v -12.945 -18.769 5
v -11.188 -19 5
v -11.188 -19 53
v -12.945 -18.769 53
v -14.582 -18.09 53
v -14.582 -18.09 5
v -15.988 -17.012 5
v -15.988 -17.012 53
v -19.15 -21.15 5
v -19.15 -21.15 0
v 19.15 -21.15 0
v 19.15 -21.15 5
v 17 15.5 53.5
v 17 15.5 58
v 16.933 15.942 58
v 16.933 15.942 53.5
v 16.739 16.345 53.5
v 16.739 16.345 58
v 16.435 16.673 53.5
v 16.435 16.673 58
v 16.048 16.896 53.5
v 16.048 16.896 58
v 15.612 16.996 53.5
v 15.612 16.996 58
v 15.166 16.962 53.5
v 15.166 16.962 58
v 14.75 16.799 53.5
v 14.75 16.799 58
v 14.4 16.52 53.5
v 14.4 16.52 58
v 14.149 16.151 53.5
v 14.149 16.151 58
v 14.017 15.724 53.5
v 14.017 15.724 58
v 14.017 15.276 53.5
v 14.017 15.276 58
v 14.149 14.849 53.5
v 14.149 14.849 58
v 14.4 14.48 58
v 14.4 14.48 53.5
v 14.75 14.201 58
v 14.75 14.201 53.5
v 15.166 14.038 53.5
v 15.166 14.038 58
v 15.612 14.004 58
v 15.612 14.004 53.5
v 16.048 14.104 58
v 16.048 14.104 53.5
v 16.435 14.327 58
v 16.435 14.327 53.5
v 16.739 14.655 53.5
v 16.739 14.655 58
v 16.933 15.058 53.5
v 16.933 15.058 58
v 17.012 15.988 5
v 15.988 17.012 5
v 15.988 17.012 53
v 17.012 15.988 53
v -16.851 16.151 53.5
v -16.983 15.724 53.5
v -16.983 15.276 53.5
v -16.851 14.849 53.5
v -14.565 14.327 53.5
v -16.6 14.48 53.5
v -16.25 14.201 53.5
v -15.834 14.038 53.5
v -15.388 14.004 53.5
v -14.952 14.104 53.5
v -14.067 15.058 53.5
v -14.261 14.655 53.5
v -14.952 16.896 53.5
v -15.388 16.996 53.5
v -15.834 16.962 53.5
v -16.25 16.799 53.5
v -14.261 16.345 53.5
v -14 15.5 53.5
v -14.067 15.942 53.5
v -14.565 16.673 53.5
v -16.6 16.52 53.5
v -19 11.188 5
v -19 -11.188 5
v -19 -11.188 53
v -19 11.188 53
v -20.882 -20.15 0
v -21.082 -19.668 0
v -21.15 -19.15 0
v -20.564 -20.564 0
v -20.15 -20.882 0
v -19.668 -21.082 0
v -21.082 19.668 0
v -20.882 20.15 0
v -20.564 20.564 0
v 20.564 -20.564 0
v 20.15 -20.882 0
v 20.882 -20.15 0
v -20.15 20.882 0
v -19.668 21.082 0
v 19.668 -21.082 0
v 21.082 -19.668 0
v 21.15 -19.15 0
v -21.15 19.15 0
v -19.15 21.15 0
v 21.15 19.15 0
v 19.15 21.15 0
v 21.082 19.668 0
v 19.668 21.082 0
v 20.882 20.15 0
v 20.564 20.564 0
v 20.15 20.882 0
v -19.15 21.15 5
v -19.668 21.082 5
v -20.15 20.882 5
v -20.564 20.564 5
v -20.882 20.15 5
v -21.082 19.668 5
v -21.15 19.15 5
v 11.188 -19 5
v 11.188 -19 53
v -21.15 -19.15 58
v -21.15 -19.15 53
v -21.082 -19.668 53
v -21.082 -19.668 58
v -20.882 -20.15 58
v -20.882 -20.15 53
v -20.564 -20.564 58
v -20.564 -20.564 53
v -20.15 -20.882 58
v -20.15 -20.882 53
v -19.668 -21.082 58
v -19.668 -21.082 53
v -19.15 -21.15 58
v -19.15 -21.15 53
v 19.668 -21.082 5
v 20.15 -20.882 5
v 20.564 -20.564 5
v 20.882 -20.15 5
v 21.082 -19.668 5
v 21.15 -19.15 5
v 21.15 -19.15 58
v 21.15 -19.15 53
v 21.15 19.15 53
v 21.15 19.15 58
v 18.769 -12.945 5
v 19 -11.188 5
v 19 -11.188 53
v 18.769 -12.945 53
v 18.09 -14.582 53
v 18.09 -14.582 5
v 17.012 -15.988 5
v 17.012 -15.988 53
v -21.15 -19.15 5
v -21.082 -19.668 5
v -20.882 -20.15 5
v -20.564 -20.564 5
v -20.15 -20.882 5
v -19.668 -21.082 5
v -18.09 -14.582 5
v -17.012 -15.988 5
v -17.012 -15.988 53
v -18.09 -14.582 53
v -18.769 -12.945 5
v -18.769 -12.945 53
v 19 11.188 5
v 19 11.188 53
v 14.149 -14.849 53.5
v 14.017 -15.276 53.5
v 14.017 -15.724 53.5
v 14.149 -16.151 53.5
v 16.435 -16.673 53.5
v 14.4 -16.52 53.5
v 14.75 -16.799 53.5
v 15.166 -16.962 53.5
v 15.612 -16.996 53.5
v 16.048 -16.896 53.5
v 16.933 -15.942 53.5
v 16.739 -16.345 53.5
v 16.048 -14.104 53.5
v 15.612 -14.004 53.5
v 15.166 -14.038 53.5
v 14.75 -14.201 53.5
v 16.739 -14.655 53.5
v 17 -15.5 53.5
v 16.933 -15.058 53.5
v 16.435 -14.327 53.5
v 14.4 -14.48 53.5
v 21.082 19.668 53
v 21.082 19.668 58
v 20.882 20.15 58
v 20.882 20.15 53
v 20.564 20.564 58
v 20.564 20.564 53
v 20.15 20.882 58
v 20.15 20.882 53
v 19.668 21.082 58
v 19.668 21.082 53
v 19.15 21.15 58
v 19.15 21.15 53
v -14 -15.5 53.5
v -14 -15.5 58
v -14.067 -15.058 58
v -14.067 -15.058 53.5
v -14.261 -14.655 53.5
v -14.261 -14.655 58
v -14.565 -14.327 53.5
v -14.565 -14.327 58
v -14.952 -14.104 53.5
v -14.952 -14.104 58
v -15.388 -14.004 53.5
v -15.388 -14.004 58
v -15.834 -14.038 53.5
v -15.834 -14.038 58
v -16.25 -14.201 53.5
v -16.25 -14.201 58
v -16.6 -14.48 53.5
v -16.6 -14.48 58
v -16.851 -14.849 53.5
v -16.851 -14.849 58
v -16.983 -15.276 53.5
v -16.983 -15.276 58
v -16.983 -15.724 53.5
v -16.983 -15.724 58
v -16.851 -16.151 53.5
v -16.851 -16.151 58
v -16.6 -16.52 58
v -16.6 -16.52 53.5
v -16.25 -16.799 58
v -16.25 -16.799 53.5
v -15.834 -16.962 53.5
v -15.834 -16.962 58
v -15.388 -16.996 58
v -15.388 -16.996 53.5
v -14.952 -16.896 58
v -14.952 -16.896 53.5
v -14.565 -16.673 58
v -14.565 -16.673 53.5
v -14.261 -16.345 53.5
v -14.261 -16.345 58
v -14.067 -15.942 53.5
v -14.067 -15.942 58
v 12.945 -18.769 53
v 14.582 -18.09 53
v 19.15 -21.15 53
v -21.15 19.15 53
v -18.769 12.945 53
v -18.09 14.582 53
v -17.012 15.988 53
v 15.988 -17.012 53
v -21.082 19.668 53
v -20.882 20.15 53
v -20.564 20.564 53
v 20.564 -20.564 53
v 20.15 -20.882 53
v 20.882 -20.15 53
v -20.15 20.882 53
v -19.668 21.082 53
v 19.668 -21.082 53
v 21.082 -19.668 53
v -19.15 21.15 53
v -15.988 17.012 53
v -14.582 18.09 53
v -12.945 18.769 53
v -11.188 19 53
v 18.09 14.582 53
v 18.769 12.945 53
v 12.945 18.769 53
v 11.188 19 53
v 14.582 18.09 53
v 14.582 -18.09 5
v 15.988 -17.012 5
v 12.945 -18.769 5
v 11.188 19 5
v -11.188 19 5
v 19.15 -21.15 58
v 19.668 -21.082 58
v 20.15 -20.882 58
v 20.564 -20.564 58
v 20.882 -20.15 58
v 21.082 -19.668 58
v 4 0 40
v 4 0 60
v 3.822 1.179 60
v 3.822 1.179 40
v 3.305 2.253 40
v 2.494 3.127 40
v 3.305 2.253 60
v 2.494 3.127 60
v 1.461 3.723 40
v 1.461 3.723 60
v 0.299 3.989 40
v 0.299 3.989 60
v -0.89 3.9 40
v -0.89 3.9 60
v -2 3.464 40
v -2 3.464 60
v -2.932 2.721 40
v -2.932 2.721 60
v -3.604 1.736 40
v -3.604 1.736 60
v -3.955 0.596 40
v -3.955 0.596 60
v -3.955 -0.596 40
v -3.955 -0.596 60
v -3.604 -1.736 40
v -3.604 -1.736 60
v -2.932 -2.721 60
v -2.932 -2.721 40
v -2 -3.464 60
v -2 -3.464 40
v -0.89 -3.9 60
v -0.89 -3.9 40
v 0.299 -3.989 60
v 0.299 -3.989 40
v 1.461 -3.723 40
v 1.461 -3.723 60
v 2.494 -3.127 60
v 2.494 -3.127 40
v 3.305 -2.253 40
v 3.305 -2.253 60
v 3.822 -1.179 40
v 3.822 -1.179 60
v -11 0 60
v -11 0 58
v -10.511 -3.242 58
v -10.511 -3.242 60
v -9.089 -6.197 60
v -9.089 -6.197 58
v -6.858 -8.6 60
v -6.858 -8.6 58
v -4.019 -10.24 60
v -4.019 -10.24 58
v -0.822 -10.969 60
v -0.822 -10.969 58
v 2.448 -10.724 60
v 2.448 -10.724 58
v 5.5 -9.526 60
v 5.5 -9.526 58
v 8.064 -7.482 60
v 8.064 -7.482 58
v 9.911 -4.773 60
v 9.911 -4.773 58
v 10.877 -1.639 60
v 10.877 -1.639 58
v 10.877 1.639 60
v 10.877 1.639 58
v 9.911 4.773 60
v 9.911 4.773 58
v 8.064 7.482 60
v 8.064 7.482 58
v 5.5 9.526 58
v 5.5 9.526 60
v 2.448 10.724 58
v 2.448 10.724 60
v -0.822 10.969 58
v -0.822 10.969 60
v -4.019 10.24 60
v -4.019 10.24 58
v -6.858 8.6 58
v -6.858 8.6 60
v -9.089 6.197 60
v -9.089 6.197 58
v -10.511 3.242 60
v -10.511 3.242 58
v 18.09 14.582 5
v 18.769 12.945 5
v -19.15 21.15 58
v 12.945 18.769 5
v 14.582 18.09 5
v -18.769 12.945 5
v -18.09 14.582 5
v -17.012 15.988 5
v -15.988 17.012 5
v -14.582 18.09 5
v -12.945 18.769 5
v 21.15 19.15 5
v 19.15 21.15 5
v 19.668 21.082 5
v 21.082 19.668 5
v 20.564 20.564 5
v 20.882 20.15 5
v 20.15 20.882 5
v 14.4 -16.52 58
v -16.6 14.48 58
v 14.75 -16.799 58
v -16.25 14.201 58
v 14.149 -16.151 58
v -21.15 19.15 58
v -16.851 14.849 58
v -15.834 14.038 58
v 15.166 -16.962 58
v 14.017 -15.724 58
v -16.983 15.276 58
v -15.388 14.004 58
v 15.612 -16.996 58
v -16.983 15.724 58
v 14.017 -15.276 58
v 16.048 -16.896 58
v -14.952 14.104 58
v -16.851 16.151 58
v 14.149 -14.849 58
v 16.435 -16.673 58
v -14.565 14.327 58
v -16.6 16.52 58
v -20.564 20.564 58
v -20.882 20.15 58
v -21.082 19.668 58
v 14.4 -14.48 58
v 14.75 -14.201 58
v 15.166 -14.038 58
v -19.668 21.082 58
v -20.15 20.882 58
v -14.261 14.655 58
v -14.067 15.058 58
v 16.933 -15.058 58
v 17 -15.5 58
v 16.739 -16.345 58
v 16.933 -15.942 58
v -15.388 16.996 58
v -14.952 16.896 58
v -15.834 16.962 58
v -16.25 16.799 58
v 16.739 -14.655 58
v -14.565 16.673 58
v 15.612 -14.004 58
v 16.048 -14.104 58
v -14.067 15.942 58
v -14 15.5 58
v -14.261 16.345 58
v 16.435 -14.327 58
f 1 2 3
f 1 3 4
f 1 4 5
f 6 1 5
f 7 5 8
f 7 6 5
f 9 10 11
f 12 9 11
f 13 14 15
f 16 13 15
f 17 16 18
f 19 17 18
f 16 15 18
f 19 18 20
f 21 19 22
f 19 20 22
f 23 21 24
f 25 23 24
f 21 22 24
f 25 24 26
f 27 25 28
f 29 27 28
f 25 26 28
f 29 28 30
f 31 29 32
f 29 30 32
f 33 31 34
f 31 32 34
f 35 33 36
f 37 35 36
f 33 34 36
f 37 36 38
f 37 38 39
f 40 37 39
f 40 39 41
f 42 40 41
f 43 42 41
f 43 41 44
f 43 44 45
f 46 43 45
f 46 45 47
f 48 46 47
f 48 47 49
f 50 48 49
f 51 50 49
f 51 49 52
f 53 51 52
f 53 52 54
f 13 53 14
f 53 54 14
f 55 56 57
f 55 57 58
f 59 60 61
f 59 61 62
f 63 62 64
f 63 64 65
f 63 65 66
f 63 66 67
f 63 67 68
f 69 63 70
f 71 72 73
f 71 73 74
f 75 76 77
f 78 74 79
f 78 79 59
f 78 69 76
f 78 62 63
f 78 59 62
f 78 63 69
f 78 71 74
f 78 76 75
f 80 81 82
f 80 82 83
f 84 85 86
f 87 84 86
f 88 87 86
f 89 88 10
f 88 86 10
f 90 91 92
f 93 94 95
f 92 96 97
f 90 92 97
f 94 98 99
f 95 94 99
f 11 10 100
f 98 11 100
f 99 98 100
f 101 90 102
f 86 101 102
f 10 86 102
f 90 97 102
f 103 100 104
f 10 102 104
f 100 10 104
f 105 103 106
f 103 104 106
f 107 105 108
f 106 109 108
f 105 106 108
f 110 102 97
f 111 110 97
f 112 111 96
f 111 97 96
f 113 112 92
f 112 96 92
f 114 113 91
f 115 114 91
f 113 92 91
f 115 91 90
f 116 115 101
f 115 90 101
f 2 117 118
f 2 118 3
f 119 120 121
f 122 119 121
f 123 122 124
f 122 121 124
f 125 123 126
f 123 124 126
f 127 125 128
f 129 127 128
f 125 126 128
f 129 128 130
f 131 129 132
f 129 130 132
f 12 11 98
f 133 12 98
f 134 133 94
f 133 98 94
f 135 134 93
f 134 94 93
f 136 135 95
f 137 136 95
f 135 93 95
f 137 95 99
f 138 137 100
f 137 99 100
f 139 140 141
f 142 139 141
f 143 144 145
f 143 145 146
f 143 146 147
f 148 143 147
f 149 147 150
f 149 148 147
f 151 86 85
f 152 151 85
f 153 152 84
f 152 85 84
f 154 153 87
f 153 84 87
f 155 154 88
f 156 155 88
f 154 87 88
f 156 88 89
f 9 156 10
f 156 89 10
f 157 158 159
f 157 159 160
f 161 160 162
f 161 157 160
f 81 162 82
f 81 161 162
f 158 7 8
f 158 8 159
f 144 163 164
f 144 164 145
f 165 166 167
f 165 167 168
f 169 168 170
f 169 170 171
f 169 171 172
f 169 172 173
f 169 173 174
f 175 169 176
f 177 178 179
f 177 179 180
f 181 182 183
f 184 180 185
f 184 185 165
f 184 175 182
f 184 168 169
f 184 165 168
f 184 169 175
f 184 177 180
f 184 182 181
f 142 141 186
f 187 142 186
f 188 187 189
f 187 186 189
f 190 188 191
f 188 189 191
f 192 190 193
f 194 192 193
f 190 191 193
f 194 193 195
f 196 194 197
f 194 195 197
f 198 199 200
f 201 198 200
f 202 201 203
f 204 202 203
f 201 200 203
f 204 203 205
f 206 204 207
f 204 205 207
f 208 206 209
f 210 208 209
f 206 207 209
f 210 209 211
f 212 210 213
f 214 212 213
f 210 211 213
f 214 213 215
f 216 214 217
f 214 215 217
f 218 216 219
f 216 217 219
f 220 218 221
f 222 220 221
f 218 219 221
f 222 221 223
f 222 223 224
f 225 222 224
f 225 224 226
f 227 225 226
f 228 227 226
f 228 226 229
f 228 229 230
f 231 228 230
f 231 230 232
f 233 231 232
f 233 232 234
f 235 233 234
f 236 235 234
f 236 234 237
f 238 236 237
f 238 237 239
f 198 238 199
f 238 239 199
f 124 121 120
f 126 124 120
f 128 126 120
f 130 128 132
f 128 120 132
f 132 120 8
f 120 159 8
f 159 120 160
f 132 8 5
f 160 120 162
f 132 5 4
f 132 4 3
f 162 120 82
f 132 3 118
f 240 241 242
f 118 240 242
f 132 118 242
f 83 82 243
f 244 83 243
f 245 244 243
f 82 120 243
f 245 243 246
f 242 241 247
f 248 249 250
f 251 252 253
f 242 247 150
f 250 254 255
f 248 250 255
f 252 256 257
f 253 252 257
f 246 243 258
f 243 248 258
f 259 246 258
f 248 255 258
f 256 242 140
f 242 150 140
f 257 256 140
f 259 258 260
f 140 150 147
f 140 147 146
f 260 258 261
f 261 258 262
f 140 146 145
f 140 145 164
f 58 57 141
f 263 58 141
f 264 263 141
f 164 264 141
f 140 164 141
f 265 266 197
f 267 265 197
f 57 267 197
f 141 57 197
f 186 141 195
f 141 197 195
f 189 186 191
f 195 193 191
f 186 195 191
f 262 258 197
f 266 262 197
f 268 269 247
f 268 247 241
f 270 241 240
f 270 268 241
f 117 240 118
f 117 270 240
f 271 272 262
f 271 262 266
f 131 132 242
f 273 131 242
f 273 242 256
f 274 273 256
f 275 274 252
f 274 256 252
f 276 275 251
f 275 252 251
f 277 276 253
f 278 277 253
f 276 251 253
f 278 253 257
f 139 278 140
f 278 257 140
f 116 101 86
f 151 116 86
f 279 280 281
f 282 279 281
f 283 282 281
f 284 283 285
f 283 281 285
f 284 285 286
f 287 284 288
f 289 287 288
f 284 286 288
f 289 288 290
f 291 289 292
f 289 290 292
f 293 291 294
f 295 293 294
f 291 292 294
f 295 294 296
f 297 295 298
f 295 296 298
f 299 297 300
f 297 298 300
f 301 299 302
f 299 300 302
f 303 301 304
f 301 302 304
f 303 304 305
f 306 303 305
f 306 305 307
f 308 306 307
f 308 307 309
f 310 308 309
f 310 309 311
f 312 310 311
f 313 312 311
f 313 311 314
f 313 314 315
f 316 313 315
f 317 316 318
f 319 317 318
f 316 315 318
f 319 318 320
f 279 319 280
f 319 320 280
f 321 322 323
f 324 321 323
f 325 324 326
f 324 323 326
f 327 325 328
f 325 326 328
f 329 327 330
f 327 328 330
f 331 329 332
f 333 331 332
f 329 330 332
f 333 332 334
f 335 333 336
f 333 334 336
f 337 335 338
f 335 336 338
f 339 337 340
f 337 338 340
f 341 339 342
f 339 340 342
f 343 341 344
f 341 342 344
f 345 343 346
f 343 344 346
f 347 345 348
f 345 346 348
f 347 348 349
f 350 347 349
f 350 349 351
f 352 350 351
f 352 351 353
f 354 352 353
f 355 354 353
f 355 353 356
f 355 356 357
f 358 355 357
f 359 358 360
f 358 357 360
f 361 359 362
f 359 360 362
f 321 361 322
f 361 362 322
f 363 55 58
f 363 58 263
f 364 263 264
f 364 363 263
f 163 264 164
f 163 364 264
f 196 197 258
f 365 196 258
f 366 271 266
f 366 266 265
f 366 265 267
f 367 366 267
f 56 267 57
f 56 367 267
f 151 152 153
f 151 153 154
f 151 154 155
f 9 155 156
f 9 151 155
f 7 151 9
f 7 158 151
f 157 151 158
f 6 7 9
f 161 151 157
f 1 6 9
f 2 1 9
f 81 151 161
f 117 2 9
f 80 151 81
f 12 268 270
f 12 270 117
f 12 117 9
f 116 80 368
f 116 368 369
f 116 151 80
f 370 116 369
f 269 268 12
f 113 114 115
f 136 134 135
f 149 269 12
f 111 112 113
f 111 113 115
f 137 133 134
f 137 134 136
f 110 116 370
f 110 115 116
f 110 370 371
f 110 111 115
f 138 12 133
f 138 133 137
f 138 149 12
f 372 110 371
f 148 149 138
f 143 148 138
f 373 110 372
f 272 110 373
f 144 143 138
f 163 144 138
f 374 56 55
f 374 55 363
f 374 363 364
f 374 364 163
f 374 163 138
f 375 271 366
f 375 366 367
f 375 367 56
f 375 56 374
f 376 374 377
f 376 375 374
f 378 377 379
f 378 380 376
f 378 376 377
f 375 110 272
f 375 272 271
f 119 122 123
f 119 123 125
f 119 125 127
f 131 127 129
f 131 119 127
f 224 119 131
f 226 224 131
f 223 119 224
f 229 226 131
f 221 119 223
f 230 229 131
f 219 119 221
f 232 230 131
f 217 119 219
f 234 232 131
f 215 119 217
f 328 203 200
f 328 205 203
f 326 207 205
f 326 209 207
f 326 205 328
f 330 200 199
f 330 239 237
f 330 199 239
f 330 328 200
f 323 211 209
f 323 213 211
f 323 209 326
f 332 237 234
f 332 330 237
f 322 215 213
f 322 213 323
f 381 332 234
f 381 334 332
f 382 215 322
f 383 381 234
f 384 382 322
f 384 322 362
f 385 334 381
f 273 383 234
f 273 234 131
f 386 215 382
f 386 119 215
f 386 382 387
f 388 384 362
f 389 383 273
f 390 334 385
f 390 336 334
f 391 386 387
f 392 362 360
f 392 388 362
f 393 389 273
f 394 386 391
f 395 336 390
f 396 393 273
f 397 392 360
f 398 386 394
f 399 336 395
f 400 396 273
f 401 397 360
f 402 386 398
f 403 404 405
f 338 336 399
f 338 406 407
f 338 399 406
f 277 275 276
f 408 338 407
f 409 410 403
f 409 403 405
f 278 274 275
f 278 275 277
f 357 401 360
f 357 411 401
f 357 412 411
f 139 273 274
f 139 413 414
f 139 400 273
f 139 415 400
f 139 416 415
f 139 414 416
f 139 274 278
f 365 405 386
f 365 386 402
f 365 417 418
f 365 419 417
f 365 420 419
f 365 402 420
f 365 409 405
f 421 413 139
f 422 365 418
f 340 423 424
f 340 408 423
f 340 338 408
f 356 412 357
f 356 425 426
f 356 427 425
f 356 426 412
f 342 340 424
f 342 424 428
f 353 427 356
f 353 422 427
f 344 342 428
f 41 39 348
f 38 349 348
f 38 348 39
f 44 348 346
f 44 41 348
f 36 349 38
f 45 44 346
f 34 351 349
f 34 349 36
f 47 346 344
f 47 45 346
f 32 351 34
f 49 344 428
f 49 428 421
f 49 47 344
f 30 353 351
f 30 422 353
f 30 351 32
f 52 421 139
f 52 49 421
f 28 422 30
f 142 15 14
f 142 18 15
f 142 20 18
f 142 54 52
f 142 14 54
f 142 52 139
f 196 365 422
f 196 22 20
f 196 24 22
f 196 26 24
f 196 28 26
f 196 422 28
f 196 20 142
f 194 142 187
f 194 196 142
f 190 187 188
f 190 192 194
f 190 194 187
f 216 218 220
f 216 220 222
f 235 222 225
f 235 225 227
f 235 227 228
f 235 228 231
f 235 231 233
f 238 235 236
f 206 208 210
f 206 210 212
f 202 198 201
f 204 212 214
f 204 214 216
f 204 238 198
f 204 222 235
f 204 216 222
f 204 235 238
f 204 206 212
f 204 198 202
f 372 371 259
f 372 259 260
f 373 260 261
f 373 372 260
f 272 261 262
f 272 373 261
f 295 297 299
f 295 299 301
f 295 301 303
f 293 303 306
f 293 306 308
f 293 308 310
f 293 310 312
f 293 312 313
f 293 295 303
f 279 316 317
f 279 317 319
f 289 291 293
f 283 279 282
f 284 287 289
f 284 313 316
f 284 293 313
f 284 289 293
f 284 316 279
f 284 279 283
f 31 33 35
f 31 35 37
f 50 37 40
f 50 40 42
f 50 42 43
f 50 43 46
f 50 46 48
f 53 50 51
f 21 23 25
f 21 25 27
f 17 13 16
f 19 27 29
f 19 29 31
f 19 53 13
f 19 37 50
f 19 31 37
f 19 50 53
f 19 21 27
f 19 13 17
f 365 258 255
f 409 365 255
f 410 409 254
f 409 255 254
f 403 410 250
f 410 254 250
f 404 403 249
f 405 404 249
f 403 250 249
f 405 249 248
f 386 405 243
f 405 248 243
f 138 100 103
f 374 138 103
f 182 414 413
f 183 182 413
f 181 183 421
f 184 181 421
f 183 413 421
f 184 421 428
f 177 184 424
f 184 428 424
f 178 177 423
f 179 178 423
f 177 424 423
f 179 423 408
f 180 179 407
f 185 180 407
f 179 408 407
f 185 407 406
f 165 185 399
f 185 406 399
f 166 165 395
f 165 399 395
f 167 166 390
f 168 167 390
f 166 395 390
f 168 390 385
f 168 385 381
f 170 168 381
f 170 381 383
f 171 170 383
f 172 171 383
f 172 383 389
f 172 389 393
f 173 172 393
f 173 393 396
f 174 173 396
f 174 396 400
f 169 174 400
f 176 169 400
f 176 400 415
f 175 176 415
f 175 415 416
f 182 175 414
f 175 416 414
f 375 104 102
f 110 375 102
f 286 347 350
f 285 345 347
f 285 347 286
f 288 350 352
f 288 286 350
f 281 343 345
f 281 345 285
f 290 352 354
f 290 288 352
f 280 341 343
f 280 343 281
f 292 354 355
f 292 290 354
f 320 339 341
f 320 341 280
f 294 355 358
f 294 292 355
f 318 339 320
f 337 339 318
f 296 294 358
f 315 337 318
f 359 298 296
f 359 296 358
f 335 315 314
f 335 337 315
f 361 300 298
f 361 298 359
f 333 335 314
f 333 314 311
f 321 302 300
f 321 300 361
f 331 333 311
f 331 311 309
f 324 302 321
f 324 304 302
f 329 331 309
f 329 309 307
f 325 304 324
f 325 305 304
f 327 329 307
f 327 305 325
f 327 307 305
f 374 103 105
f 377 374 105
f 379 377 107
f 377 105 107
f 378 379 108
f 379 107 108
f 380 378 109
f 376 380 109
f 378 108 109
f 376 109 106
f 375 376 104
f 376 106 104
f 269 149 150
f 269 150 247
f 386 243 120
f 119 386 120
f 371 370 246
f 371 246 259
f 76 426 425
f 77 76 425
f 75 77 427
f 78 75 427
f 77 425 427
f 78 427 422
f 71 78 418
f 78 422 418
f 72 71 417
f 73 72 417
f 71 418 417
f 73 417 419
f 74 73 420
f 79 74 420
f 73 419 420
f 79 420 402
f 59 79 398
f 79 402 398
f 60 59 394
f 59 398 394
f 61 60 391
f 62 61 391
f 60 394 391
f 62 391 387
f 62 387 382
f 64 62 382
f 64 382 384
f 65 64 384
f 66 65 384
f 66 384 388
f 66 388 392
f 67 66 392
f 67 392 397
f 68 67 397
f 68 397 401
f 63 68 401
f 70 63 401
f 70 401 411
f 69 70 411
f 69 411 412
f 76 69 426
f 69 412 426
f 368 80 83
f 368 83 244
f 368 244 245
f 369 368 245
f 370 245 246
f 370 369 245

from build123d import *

# Parameters (mm, degrees)
EXTRUDE_1_DEPTH     = 5
EXTRUDE_2_DEPTH     = 48
EXTRUDE_4_DEPTH     = 5
SKETCH_4_R          = 1.5
CUT_EXTRUDE_1_DEPTH = 4.5
SKETCH_5_R          = 11
EXTRUDE_5_DEPTH     = 2
SKETCH_6_R          = 4
CUT_EXTRUDE_2_DEPTH = 20


with BuildPart() as part:
    # 草图1 → 凸台-拉伸1 (new body)
    with BuildSketch(Plane.XY):
        with BuildLine():
            Line((-19.15, -21.15), (19.15, -21.15))
            ThreePointArc((19.15, -21.15), (20.564213562, -20.564213562), (21.15, -19.15))
            Line((21.15, -19.15), (21.15, 19.15))
            ThreePointArc((21.15, 19.15), (20.564213562, 20.564213562), (19.15, 21.15))
            Line((19.15, 21.15), (-19.15, 21.15))
            ThreePointArc((-19.15, 21.15), (-20.564213562, 20.564213562), (-21.15, 19.15))
            Line((-21.15, 19.15), (-21.15, -19.15))
            ThreePointArc((-21.15, -19.15), (-20.564213562, -20.564213562), (-19.15, -21.15))
        make_face()
    extrude(amount=EXTRUDE_1_DEPTH)

    # 草图2 → 凸台-拉伸2 (add)
    with BuildSketch(Plane.XY.offset(5)):
        with BuildLine():
            Line((-17.011566207, 15.988433793), (-15.988433793, 17.011566207))
            ThreePointArc((-15.988433793, 17.011566207), (-13.785943914, 18.483222894), (-11.187929962, 19))
            Line((-11.187929962, 19), (11.187929962, 19))
            ThreePointArc((11.187929962, 19), (13.785943914, 18.483222894), (15.988433793, 17.011566207))
            Line((15.988433793, 17.011566207), (17.011566207, 15.988433793))
            ThreePointArc((17.011566207, 15.988433793), (18.483222894, 13.785943914), (19, 11.187929962))
            Line((19, 11.187929962), (19, -11.187929962))
            ThreePointArc((19, -11.187929962), (18.483222894, -13.785943914), (17.011566207, -15.988433793))
            Line((17.011566207, -15.988433793), (15.988433793, -17.011566207))
            ThreePointArc((15.988433793, -17.011566207), (13.785943914, -18.483222894), (11.187929962, -19))
            Line((11.187929962, -19), (-11.187929962, -19))
            ThreePointArc((-11.187929962, -19), (-13.785943914, -18.483222894), (-15.988433793, -17.011566207))
            Line((-15.988433793, -17.011566207), (-17.011566207, -15.988433793))
            ThreePointArc((-17.011566207, -15.988433793), (-18.483222894, -13.785943914), (-19, -11.187929962))
            Line((-19, -11.187929962), (-19, 11.187929962))
            ThreePointArc((-19, 11.187929962), (-18.483222894, 13.785943914), (-17.011566207, 15.988433793))
        make_face()
    extrude(amount=EXTRUDE_2_DEPTH)

    # 草图3 → 凸台-拉伸4 (add)
    with BuildSketch(Plane.XY.offset(53)):
        with BuildLine():
            Line((-19.15, -21.15), (19.15, -21.15))
            ThreePointArc((19.15, -21.15), (20.564213562, -20.564213562), (21.15, -19.15))
            Line((21.15, -19.15), (21.15, 19.15))
            ThreePointArc((21.15, 19.15), (20.564213562, 20.564213562), (19.15, 21.15))
            Line((19.15, 21.15), (-19.15, 21.15))
            ThreePointArc((-19.15, 21.15), (-20.564213562, 20.564213562), (-21.15, 19.15))
            Line((-21.15, 19.15), (-21.15, -19.15))
            ThreePointArc((-21.15, -19.15), (-20.564213562, -20.564213562), (-19.15, -21.15))
        make_face()
    extrude(amount=EXTRUDE_4_DEPTH)

    # 草图4 → 切除-拉伸1 (cut)
    with BuildSketch(Plane.XY.offset(58)):
        with Locations((15.5, 15.5)):
            Circle(SKETCH_4_R)
        with Locations((15.5, -15.5)):
            Circle(SKETCH_4_R)
        with Locations((-15.5, -15.5)):
            Circle(SKETCH_4_R)
        with Locations((-15.5, 15.5)):
            Circle(SKETCH_4_R)
    extrude(amount=-CUT_EXTRUDE_1_DEPTH, mode=Mode.SUBTRACT)

    # 草图5 → 凸台-拉伸5 (add)
    with BuildSketch(Plane.XY.offset(58)):
        with Locations(Location((0, 0, 0), (0, 0, 180))):
            Circle(SKETCH_5_R)
    extrude(amount=EXTRUDE_5_DEPTH)

    # 草图6 → 切除-拉伸2 (cut)
    with BuildSketch(Plane.XY.offset(60)):
        Circle(SKETCH_6_R)
    extrude(amount=-CUT_EXTRUDE_2_DEPTH, mode=Mode.SUBTRACT)


solid = part.part
